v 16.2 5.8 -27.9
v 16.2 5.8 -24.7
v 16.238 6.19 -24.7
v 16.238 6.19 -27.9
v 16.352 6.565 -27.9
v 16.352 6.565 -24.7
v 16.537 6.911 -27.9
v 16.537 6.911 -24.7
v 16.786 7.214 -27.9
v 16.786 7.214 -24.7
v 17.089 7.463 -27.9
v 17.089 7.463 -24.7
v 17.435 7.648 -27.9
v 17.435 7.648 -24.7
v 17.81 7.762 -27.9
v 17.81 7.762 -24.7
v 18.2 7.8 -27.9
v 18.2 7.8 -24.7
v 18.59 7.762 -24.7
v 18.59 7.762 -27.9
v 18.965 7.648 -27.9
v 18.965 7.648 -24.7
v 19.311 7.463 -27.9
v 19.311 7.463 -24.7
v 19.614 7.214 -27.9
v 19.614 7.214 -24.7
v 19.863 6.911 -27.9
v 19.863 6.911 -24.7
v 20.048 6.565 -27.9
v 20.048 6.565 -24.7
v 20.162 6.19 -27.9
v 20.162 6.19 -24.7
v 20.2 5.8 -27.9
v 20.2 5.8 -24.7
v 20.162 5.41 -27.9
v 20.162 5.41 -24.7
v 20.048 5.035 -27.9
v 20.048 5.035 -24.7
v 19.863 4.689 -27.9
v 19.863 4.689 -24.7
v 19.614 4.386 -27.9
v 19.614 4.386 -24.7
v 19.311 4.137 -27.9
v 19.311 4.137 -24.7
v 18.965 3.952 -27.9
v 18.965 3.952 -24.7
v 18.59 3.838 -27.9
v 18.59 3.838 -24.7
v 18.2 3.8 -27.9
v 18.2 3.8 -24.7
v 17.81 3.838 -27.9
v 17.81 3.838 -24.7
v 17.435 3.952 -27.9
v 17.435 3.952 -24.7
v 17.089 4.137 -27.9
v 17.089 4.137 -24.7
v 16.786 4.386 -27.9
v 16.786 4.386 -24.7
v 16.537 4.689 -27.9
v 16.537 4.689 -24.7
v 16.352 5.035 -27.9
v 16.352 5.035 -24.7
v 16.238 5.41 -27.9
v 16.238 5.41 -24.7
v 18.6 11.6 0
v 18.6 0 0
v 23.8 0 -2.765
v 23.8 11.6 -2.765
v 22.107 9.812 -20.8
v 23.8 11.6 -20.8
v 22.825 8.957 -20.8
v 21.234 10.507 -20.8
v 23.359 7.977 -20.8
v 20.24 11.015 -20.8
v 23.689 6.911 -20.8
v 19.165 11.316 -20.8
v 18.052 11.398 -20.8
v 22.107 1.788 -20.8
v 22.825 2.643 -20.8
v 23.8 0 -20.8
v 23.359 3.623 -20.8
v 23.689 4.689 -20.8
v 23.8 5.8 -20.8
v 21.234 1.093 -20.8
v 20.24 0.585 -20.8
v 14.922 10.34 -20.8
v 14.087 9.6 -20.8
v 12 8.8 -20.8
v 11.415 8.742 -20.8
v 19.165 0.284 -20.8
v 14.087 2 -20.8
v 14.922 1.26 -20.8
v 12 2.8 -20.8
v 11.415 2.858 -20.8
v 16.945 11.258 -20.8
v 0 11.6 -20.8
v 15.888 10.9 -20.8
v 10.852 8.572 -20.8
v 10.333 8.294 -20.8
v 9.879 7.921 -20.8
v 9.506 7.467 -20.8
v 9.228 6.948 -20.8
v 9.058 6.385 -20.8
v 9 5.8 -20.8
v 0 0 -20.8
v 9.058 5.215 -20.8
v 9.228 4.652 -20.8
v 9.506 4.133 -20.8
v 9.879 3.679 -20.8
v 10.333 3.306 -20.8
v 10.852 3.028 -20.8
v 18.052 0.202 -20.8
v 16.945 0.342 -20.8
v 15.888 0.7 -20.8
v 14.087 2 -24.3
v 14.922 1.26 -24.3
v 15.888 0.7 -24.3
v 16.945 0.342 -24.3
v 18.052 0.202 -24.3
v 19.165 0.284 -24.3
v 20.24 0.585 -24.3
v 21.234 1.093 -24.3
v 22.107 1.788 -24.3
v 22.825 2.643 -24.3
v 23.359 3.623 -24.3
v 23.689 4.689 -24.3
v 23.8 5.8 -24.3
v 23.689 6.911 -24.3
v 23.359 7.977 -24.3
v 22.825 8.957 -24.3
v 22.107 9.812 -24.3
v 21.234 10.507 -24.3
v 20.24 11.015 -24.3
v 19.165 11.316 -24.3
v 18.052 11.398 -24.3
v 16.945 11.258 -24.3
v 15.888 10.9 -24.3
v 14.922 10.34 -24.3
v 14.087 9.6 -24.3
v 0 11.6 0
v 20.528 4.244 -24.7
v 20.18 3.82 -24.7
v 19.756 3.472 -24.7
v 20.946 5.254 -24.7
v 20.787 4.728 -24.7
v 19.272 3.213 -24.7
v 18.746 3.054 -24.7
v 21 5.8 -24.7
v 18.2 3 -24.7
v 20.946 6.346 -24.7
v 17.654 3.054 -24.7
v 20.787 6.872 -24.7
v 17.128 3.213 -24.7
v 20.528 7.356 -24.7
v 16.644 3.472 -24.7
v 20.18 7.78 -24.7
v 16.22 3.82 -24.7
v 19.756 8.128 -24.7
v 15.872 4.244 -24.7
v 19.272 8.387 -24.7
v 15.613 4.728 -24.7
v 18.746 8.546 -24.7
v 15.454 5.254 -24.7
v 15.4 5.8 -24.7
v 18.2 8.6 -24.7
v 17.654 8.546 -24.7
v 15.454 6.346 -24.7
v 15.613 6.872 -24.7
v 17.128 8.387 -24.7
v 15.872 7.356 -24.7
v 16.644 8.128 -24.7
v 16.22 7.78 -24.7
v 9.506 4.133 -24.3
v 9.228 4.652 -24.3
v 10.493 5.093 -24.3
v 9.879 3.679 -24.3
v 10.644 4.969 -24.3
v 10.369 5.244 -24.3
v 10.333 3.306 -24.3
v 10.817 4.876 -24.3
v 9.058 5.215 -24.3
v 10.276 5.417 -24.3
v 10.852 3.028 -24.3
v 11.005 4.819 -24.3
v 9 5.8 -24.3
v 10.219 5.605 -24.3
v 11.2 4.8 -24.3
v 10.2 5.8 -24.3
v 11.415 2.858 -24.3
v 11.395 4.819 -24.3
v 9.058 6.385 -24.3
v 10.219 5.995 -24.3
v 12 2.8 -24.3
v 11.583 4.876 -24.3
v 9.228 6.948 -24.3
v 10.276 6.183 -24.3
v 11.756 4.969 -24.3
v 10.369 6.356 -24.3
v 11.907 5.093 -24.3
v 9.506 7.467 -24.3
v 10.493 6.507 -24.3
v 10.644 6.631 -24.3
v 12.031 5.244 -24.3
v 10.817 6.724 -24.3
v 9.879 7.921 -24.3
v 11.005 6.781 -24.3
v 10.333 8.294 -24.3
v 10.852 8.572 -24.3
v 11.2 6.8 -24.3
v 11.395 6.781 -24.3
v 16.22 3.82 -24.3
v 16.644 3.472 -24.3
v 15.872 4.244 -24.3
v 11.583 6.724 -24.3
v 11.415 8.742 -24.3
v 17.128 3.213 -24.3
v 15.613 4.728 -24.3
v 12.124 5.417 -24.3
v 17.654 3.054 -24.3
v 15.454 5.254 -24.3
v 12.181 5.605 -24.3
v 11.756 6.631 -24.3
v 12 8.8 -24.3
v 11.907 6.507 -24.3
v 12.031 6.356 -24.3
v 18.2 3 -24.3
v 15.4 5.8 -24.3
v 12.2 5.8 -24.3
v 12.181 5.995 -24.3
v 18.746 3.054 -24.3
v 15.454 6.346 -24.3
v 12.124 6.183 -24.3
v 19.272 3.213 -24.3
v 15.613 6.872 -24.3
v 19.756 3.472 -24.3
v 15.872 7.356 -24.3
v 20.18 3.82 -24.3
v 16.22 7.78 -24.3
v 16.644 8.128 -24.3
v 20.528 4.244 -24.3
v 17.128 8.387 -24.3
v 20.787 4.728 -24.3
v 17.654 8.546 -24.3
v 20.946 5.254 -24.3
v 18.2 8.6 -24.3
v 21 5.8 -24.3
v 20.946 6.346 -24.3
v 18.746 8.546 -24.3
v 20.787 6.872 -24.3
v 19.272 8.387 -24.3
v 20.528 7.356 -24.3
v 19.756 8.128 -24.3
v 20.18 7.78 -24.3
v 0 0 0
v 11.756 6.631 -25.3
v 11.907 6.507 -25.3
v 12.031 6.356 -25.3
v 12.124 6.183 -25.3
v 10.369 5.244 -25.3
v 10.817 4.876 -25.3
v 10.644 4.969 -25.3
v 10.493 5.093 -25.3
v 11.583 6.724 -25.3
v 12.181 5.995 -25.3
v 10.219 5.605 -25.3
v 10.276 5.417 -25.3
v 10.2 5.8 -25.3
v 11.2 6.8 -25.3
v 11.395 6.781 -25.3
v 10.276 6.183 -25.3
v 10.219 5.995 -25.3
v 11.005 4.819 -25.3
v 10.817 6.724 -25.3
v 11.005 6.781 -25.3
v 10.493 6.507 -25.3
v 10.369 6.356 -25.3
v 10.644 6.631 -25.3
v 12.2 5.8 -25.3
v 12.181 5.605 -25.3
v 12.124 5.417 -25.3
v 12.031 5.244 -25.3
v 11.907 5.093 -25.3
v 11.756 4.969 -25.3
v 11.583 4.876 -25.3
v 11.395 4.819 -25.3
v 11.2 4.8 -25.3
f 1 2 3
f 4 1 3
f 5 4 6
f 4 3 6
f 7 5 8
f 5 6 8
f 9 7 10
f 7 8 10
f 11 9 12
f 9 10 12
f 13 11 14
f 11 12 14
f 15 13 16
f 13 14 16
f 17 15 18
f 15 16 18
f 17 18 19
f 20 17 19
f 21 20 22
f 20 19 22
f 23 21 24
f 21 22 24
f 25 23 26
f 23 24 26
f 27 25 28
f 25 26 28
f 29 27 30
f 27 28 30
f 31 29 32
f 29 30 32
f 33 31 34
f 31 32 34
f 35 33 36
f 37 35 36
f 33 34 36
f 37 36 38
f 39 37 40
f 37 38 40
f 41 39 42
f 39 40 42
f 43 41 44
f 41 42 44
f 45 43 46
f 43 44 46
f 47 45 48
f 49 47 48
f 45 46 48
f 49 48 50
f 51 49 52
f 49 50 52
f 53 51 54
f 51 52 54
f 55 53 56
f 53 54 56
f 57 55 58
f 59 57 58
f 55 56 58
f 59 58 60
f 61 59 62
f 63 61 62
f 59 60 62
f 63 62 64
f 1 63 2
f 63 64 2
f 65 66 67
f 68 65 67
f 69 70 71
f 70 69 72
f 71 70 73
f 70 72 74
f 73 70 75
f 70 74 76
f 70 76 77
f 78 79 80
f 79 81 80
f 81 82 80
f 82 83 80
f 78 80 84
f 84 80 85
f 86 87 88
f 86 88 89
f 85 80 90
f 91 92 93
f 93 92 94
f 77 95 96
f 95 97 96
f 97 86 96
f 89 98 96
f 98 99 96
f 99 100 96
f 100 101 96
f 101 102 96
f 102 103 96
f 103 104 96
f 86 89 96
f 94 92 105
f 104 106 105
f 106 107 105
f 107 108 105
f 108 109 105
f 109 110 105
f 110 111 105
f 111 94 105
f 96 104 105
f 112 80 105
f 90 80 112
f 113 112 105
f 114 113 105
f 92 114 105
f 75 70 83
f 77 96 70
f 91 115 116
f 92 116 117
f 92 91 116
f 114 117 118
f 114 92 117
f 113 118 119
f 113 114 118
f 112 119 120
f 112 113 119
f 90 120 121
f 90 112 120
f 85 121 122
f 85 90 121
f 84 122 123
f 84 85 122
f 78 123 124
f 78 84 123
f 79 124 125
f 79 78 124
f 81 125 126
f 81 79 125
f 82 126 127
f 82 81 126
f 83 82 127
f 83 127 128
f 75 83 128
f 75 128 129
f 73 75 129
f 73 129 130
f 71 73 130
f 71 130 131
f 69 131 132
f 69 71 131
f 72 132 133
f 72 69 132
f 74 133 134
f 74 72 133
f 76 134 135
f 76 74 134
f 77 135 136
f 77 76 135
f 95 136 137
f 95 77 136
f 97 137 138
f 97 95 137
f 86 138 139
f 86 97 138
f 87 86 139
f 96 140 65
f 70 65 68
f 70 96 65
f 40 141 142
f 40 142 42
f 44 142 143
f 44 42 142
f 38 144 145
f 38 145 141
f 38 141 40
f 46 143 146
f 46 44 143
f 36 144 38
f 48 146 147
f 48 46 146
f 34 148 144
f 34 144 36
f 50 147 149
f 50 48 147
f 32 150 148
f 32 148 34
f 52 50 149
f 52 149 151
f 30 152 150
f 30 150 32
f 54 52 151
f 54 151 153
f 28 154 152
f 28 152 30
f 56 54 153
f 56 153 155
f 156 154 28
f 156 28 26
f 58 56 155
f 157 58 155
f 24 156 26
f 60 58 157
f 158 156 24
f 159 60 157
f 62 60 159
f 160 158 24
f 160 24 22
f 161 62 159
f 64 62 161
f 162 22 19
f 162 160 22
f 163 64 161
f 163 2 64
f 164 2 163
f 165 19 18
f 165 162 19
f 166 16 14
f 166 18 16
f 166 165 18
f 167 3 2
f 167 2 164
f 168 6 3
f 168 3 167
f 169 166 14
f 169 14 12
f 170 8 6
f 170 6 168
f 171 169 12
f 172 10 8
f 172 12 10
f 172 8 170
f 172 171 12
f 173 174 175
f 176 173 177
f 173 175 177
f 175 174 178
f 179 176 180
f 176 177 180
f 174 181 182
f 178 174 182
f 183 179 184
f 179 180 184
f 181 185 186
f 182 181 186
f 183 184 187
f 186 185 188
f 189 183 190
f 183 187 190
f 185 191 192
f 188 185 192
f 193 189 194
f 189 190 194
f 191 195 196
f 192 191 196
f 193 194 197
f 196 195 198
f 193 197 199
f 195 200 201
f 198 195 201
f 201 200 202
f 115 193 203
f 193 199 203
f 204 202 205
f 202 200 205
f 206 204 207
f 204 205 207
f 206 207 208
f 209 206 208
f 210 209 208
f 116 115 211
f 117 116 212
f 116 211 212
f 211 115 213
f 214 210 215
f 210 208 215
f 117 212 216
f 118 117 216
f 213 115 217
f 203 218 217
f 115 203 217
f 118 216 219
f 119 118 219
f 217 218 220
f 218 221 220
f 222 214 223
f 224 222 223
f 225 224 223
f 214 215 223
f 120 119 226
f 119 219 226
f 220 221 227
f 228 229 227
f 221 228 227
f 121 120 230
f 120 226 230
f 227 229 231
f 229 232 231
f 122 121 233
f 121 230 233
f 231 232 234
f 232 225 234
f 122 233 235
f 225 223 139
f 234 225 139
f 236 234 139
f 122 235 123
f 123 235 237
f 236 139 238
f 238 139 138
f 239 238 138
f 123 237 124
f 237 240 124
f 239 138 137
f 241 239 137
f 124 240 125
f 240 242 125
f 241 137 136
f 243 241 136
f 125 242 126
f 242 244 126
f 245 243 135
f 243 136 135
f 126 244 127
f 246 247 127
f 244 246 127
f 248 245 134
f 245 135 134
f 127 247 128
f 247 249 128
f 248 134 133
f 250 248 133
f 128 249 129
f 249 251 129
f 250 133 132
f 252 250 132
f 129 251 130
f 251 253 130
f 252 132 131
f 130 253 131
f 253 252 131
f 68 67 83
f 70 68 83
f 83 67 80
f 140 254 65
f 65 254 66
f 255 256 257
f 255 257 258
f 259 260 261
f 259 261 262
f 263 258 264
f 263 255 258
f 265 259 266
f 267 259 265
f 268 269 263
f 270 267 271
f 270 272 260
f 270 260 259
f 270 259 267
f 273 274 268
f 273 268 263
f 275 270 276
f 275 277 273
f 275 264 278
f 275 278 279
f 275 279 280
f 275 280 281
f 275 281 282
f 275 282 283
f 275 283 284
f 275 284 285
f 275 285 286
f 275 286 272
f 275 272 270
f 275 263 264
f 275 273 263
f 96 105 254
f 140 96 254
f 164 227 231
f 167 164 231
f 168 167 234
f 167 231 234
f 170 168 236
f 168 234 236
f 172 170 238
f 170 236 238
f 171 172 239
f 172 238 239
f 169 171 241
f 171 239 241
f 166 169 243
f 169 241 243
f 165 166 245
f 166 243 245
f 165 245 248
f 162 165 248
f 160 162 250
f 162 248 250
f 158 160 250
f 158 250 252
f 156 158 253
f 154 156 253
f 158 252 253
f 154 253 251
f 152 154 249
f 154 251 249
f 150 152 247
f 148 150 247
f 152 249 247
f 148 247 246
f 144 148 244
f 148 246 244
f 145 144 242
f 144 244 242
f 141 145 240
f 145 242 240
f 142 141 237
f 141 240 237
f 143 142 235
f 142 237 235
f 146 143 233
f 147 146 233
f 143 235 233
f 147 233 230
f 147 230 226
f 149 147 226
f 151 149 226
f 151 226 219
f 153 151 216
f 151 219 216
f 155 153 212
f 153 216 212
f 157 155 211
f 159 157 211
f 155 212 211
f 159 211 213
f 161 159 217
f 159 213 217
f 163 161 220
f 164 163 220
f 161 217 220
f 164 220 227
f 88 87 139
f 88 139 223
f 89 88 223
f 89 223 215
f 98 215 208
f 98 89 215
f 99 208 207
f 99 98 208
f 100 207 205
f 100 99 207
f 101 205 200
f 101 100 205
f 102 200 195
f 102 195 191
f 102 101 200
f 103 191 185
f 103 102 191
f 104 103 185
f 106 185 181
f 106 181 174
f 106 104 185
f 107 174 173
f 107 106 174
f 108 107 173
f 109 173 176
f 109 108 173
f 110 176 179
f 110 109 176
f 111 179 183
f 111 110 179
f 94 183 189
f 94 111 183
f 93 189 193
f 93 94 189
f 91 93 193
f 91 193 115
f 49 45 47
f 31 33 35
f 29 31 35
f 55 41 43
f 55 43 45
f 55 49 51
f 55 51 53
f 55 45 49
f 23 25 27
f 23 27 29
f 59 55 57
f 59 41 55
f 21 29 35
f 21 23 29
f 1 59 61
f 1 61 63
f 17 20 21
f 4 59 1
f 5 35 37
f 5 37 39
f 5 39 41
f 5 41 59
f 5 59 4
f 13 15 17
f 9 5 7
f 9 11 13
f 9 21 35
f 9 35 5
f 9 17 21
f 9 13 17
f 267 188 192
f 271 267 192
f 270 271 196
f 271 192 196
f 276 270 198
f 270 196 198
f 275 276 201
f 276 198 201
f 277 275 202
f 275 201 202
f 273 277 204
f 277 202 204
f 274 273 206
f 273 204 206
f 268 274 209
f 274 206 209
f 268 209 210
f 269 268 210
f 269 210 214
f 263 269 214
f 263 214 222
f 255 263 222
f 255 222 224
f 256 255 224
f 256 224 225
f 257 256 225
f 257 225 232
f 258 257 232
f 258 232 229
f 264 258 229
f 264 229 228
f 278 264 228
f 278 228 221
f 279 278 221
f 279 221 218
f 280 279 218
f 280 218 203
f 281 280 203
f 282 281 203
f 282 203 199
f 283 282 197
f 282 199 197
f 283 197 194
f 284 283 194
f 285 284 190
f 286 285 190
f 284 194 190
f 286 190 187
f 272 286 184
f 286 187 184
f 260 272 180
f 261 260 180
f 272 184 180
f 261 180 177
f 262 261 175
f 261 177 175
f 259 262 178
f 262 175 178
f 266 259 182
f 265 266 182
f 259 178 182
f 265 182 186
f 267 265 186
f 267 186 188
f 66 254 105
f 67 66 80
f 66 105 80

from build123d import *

# Parameters (mm, degrees)
EXTRUDE_1_DEPTH = 11.6
EXTRUDE_2_DEPTH = 3.5
SKETCH_3_R      = 1
EXTRUDE_3_DEPTH = 1
SKETCH_3_3_R    = 1
SKETCH_3_3_R_2  = 2.8
EXTRUDE_4_DEPTH = 0.4
SKETCH_5_R      = 2
EXTRUDE_5_DEPTH = 3.2


with BuildPart() as part:
    # ｽｹｯﾁ1 → ﾎﾞｽ - 押し出し1 (new body)
    with BuildSketch(Plane(origin=(0, 0, 0), x_dir=(1, 0, 0), z_dir=(0, 1, 0))):
        Polygon((0, 0), (18.6, 0), (23.8, 2.764889045), (23.8, 20.8), (0, 20.8), align=None)
    extrude(amount=EXTRUDE_1_DEPTH)

    # ｽｹｯﾁ2 → ﾎﾞｽ - 押し出し2 (add)
    with BuildSketch(Plane(origin=(0, 0, -20.8), x_dir=(-1, 0, 0), z_dir=(0, 0, -1))):
        with BuildLine():
            Line((-14.08660724, 9.6), (-12, 8.8))
            ThreePointArc((-12, 8.8), (-9, 5.8), (-12, 2.8))
            Line((-12, 2.8), (-14.08660724, 2))
            ThreePointArc((-14.08660724, 2), (-23.8, 5.8), (-14.08660724, 9.6))
        make_face()
    extrude(amount=EXTRUDE_2_DEPTH)

    # ｽｹｯﾁ3 → ﾎﾞｽ - 押し出し3 (add)
    with BuildSketch(Plane(origin=(0, 0, -24.3), x_dir=(-1, 0, 0), z_dir=(0, 0, -1))):
        with Locations((-11.2, 5.8)):
            Circle(SKETCH_3_R)
    extrude(amount=EXTRUDE_3_DEPTH)

    # ｽｹｯﾁ3<3> → ﾎﾞｽ - 押し出し4 (add)
    with BuildSketch(Plane(origin=(0, 0, -24.3), x_dir=(-1, 0, 0), z_dir=(0, 0, -1))):
        with Locations((-11.2, 5.8)):
            Circle(SKETCH_3_3_R)
        with Locations((-18.2, 5.8)):
            Circle(SKETCH_3_3_R_2)
    extrude(amount=EXTRUDE_4_DEPTH)

    # ｽｹｯﾁ5 → ﾎﾞｽ - 押し出し5 (add)
    with BuildSketch(Plane(origin=(0, 0, -24.7), x_dir=(-1, 0, 0), z_dir=(0, 0, -1))):
        with Locations((-18.2, 5.8)):
            Circle(SKETCH_5_R)
    extrude(amount=EXTRUDE_5_DEPTH)


solid = part.part
